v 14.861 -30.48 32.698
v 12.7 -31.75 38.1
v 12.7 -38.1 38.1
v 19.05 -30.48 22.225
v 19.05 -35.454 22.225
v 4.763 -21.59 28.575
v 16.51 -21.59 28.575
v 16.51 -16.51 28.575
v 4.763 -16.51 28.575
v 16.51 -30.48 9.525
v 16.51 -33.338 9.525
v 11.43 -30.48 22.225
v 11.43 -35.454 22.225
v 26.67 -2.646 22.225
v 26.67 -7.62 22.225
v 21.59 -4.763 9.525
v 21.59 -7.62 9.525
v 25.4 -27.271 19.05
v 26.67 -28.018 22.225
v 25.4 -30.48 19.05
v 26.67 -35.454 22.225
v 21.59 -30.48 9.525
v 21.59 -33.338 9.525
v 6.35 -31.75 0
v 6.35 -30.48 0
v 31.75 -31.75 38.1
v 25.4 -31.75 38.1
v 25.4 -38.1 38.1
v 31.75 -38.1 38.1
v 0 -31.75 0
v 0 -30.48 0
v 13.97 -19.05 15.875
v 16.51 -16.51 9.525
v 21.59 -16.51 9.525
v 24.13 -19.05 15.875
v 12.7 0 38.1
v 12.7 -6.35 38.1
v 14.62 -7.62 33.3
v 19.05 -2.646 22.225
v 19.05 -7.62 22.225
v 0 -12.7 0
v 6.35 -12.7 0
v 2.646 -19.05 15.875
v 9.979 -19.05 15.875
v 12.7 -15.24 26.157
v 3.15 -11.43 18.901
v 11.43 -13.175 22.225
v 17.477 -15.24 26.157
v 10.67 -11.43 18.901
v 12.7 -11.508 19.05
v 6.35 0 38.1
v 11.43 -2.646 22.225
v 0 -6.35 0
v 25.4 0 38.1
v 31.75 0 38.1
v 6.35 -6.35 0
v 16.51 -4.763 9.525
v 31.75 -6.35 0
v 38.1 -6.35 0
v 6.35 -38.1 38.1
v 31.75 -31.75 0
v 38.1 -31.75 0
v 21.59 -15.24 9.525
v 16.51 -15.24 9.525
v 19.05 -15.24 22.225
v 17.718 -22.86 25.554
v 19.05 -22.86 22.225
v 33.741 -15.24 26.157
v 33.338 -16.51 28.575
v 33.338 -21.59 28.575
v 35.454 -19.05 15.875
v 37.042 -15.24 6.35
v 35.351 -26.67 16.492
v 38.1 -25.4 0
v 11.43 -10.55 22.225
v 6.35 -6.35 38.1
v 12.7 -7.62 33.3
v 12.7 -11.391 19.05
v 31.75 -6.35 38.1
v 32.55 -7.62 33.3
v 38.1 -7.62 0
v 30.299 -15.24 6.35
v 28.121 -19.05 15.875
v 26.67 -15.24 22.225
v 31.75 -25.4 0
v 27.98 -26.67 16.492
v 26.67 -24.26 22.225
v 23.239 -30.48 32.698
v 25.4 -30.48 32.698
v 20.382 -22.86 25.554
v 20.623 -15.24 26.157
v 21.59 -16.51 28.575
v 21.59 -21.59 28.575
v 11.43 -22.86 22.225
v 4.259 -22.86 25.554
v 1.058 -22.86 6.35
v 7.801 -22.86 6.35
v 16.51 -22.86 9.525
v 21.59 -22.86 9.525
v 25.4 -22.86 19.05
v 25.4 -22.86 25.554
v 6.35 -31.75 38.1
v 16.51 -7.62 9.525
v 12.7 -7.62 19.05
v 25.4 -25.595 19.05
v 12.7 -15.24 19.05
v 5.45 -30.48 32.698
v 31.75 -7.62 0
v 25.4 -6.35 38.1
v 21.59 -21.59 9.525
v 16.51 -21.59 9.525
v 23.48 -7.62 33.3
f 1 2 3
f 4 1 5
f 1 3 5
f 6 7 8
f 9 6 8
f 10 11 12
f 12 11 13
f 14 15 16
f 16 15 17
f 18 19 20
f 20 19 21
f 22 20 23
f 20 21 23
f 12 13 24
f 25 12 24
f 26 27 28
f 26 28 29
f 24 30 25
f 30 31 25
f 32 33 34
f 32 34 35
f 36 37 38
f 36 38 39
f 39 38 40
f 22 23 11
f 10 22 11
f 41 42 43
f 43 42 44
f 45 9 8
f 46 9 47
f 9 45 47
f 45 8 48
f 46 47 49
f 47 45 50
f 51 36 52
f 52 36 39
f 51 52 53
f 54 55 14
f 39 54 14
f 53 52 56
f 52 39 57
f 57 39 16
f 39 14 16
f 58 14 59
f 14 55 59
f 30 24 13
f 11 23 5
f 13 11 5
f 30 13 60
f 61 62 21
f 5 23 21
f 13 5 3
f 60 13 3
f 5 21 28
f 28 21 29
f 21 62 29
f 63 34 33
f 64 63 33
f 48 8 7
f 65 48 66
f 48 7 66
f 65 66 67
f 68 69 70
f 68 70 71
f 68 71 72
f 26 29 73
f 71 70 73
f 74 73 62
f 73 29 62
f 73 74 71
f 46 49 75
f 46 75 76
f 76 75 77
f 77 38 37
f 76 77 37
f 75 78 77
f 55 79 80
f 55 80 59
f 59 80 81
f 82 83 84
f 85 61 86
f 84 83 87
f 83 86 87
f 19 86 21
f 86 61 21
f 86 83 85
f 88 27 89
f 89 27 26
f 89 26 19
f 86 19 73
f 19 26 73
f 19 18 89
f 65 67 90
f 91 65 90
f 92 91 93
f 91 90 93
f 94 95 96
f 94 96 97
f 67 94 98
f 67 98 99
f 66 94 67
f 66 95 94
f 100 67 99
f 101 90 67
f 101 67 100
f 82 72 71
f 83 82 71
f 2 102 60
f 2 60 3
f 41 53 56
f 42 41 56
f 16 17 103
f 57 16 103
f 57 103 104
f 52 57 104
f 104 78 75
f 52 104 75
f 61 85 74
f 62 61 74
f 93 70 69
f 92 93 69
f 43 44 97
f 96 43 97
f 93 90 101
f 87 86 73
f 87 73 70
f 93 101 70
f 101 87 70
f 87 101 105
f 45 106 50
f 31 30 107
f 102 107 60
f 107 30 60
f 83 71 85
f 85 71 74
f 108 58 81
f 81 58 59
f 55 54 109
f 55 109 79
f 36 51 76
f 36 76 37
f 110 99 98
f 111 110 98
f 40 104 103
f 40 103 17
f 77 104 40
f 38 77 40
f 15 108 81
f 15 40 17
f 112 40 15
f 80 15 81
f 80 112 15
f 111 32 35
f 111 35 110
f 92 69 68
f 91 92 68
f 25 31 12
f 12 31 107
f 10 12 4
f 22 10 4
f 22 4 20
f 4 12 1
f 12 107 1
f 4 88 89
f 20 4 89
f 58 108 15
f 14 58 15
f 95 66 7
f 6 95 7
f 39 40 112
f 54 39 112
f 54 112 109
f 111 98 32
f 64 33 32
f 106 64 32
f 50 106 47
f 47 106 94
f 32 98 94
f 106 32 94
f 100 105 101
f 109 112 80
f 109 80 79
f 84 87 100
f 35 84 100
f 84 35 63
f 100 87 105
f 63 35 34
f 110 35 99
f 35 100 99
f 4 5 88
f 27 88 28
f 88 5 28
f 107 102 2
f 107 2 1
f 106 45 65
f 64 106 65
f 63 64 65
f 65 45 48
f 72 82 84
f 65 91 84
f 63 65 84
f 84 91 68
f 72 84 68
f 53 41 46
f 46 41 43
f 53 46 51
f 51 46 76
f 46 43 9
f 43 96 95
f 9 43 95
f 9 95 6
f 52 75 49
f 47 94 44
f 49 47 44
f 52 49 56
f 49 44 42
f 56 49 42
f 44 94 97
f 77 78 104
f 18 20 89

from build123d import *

# Parameters (mm, degrees)
F0_W      = 38.1
F0_H      = 38.1
F1_DEPTH  = 38.1
F6_DEPTH  = 38.1
F8_DEPTH  = 38.1
F9_W      = 25.4
F9_H      = 7.62
F10_DEPTH = 38.1


with BuildPart() as f1:
    # F0 (on Front) → F1 (new body)
    with BuildSketch(Plane.XZ):
        with Locations((19.05, 19.05)):
            Rectangle(F0_W, F0_H)
    extrude(amount=F1_DEPTH)

    # F5 (on offset) → F6 (cut)
    with BuildSketch(Plane.YZ.offset(38.1)):
        Polygon((-11.43, 18.901093), (-6.35, 38.1), (-31.75, 38.1), (-26.67, 16.491907), (-21.59, 28.575), (-16.51, 28.575), align=None)
        Polygon((-6.35, 0), (0, 0), (0, 38.1), align=None)
        Polygon((-25.4, 0), (-12.7, 0), (-19.05, 15.875), align=None)
        Polygon((-31.75, 0), (-38.1, 38.1), (-38.1, 0), align=None)
    extrude(amount=-F6_DEPTH, mode=Mode.SUBTRACT)

    # F7 (on offset) → F8 (cut)
    with BuildSketch(Plane.XZ.offset(38.1)):
        Polygon((0, 38.1), (0, 0), (6.35, 38.1), align=None)
        Polygon((11.43, 22.225), (6.35, 0), (31.75, 0), (26.67, 22.225), (21.59, 9.525), (16.51, 9.525), align=None)
        Polygon((31.75, 38.1), (38.1, 0), (38.1, 38.1), align=None)
        Polygon((25.4, 38.1), (12.7, 38.1), (19.05, 22.225), align=None)
    extrude(amount=-F8_DEPTH, mode=Mode.SUBTRACT)

    # F9 (on offset) → F10 (cut)
    with BuildSketch(Plane.XY.offset(38.1)):
        with Locations((25.4, -11.43)):
            Rectangle(F9_W, F9_H)
        with Locations((12.7, -26.67)):
            Rectangle(F9_W, F9_H)
    extrude(amount=-F10_DEPTH, mode=Mode.SUBTRACT)


solid = f1.part
